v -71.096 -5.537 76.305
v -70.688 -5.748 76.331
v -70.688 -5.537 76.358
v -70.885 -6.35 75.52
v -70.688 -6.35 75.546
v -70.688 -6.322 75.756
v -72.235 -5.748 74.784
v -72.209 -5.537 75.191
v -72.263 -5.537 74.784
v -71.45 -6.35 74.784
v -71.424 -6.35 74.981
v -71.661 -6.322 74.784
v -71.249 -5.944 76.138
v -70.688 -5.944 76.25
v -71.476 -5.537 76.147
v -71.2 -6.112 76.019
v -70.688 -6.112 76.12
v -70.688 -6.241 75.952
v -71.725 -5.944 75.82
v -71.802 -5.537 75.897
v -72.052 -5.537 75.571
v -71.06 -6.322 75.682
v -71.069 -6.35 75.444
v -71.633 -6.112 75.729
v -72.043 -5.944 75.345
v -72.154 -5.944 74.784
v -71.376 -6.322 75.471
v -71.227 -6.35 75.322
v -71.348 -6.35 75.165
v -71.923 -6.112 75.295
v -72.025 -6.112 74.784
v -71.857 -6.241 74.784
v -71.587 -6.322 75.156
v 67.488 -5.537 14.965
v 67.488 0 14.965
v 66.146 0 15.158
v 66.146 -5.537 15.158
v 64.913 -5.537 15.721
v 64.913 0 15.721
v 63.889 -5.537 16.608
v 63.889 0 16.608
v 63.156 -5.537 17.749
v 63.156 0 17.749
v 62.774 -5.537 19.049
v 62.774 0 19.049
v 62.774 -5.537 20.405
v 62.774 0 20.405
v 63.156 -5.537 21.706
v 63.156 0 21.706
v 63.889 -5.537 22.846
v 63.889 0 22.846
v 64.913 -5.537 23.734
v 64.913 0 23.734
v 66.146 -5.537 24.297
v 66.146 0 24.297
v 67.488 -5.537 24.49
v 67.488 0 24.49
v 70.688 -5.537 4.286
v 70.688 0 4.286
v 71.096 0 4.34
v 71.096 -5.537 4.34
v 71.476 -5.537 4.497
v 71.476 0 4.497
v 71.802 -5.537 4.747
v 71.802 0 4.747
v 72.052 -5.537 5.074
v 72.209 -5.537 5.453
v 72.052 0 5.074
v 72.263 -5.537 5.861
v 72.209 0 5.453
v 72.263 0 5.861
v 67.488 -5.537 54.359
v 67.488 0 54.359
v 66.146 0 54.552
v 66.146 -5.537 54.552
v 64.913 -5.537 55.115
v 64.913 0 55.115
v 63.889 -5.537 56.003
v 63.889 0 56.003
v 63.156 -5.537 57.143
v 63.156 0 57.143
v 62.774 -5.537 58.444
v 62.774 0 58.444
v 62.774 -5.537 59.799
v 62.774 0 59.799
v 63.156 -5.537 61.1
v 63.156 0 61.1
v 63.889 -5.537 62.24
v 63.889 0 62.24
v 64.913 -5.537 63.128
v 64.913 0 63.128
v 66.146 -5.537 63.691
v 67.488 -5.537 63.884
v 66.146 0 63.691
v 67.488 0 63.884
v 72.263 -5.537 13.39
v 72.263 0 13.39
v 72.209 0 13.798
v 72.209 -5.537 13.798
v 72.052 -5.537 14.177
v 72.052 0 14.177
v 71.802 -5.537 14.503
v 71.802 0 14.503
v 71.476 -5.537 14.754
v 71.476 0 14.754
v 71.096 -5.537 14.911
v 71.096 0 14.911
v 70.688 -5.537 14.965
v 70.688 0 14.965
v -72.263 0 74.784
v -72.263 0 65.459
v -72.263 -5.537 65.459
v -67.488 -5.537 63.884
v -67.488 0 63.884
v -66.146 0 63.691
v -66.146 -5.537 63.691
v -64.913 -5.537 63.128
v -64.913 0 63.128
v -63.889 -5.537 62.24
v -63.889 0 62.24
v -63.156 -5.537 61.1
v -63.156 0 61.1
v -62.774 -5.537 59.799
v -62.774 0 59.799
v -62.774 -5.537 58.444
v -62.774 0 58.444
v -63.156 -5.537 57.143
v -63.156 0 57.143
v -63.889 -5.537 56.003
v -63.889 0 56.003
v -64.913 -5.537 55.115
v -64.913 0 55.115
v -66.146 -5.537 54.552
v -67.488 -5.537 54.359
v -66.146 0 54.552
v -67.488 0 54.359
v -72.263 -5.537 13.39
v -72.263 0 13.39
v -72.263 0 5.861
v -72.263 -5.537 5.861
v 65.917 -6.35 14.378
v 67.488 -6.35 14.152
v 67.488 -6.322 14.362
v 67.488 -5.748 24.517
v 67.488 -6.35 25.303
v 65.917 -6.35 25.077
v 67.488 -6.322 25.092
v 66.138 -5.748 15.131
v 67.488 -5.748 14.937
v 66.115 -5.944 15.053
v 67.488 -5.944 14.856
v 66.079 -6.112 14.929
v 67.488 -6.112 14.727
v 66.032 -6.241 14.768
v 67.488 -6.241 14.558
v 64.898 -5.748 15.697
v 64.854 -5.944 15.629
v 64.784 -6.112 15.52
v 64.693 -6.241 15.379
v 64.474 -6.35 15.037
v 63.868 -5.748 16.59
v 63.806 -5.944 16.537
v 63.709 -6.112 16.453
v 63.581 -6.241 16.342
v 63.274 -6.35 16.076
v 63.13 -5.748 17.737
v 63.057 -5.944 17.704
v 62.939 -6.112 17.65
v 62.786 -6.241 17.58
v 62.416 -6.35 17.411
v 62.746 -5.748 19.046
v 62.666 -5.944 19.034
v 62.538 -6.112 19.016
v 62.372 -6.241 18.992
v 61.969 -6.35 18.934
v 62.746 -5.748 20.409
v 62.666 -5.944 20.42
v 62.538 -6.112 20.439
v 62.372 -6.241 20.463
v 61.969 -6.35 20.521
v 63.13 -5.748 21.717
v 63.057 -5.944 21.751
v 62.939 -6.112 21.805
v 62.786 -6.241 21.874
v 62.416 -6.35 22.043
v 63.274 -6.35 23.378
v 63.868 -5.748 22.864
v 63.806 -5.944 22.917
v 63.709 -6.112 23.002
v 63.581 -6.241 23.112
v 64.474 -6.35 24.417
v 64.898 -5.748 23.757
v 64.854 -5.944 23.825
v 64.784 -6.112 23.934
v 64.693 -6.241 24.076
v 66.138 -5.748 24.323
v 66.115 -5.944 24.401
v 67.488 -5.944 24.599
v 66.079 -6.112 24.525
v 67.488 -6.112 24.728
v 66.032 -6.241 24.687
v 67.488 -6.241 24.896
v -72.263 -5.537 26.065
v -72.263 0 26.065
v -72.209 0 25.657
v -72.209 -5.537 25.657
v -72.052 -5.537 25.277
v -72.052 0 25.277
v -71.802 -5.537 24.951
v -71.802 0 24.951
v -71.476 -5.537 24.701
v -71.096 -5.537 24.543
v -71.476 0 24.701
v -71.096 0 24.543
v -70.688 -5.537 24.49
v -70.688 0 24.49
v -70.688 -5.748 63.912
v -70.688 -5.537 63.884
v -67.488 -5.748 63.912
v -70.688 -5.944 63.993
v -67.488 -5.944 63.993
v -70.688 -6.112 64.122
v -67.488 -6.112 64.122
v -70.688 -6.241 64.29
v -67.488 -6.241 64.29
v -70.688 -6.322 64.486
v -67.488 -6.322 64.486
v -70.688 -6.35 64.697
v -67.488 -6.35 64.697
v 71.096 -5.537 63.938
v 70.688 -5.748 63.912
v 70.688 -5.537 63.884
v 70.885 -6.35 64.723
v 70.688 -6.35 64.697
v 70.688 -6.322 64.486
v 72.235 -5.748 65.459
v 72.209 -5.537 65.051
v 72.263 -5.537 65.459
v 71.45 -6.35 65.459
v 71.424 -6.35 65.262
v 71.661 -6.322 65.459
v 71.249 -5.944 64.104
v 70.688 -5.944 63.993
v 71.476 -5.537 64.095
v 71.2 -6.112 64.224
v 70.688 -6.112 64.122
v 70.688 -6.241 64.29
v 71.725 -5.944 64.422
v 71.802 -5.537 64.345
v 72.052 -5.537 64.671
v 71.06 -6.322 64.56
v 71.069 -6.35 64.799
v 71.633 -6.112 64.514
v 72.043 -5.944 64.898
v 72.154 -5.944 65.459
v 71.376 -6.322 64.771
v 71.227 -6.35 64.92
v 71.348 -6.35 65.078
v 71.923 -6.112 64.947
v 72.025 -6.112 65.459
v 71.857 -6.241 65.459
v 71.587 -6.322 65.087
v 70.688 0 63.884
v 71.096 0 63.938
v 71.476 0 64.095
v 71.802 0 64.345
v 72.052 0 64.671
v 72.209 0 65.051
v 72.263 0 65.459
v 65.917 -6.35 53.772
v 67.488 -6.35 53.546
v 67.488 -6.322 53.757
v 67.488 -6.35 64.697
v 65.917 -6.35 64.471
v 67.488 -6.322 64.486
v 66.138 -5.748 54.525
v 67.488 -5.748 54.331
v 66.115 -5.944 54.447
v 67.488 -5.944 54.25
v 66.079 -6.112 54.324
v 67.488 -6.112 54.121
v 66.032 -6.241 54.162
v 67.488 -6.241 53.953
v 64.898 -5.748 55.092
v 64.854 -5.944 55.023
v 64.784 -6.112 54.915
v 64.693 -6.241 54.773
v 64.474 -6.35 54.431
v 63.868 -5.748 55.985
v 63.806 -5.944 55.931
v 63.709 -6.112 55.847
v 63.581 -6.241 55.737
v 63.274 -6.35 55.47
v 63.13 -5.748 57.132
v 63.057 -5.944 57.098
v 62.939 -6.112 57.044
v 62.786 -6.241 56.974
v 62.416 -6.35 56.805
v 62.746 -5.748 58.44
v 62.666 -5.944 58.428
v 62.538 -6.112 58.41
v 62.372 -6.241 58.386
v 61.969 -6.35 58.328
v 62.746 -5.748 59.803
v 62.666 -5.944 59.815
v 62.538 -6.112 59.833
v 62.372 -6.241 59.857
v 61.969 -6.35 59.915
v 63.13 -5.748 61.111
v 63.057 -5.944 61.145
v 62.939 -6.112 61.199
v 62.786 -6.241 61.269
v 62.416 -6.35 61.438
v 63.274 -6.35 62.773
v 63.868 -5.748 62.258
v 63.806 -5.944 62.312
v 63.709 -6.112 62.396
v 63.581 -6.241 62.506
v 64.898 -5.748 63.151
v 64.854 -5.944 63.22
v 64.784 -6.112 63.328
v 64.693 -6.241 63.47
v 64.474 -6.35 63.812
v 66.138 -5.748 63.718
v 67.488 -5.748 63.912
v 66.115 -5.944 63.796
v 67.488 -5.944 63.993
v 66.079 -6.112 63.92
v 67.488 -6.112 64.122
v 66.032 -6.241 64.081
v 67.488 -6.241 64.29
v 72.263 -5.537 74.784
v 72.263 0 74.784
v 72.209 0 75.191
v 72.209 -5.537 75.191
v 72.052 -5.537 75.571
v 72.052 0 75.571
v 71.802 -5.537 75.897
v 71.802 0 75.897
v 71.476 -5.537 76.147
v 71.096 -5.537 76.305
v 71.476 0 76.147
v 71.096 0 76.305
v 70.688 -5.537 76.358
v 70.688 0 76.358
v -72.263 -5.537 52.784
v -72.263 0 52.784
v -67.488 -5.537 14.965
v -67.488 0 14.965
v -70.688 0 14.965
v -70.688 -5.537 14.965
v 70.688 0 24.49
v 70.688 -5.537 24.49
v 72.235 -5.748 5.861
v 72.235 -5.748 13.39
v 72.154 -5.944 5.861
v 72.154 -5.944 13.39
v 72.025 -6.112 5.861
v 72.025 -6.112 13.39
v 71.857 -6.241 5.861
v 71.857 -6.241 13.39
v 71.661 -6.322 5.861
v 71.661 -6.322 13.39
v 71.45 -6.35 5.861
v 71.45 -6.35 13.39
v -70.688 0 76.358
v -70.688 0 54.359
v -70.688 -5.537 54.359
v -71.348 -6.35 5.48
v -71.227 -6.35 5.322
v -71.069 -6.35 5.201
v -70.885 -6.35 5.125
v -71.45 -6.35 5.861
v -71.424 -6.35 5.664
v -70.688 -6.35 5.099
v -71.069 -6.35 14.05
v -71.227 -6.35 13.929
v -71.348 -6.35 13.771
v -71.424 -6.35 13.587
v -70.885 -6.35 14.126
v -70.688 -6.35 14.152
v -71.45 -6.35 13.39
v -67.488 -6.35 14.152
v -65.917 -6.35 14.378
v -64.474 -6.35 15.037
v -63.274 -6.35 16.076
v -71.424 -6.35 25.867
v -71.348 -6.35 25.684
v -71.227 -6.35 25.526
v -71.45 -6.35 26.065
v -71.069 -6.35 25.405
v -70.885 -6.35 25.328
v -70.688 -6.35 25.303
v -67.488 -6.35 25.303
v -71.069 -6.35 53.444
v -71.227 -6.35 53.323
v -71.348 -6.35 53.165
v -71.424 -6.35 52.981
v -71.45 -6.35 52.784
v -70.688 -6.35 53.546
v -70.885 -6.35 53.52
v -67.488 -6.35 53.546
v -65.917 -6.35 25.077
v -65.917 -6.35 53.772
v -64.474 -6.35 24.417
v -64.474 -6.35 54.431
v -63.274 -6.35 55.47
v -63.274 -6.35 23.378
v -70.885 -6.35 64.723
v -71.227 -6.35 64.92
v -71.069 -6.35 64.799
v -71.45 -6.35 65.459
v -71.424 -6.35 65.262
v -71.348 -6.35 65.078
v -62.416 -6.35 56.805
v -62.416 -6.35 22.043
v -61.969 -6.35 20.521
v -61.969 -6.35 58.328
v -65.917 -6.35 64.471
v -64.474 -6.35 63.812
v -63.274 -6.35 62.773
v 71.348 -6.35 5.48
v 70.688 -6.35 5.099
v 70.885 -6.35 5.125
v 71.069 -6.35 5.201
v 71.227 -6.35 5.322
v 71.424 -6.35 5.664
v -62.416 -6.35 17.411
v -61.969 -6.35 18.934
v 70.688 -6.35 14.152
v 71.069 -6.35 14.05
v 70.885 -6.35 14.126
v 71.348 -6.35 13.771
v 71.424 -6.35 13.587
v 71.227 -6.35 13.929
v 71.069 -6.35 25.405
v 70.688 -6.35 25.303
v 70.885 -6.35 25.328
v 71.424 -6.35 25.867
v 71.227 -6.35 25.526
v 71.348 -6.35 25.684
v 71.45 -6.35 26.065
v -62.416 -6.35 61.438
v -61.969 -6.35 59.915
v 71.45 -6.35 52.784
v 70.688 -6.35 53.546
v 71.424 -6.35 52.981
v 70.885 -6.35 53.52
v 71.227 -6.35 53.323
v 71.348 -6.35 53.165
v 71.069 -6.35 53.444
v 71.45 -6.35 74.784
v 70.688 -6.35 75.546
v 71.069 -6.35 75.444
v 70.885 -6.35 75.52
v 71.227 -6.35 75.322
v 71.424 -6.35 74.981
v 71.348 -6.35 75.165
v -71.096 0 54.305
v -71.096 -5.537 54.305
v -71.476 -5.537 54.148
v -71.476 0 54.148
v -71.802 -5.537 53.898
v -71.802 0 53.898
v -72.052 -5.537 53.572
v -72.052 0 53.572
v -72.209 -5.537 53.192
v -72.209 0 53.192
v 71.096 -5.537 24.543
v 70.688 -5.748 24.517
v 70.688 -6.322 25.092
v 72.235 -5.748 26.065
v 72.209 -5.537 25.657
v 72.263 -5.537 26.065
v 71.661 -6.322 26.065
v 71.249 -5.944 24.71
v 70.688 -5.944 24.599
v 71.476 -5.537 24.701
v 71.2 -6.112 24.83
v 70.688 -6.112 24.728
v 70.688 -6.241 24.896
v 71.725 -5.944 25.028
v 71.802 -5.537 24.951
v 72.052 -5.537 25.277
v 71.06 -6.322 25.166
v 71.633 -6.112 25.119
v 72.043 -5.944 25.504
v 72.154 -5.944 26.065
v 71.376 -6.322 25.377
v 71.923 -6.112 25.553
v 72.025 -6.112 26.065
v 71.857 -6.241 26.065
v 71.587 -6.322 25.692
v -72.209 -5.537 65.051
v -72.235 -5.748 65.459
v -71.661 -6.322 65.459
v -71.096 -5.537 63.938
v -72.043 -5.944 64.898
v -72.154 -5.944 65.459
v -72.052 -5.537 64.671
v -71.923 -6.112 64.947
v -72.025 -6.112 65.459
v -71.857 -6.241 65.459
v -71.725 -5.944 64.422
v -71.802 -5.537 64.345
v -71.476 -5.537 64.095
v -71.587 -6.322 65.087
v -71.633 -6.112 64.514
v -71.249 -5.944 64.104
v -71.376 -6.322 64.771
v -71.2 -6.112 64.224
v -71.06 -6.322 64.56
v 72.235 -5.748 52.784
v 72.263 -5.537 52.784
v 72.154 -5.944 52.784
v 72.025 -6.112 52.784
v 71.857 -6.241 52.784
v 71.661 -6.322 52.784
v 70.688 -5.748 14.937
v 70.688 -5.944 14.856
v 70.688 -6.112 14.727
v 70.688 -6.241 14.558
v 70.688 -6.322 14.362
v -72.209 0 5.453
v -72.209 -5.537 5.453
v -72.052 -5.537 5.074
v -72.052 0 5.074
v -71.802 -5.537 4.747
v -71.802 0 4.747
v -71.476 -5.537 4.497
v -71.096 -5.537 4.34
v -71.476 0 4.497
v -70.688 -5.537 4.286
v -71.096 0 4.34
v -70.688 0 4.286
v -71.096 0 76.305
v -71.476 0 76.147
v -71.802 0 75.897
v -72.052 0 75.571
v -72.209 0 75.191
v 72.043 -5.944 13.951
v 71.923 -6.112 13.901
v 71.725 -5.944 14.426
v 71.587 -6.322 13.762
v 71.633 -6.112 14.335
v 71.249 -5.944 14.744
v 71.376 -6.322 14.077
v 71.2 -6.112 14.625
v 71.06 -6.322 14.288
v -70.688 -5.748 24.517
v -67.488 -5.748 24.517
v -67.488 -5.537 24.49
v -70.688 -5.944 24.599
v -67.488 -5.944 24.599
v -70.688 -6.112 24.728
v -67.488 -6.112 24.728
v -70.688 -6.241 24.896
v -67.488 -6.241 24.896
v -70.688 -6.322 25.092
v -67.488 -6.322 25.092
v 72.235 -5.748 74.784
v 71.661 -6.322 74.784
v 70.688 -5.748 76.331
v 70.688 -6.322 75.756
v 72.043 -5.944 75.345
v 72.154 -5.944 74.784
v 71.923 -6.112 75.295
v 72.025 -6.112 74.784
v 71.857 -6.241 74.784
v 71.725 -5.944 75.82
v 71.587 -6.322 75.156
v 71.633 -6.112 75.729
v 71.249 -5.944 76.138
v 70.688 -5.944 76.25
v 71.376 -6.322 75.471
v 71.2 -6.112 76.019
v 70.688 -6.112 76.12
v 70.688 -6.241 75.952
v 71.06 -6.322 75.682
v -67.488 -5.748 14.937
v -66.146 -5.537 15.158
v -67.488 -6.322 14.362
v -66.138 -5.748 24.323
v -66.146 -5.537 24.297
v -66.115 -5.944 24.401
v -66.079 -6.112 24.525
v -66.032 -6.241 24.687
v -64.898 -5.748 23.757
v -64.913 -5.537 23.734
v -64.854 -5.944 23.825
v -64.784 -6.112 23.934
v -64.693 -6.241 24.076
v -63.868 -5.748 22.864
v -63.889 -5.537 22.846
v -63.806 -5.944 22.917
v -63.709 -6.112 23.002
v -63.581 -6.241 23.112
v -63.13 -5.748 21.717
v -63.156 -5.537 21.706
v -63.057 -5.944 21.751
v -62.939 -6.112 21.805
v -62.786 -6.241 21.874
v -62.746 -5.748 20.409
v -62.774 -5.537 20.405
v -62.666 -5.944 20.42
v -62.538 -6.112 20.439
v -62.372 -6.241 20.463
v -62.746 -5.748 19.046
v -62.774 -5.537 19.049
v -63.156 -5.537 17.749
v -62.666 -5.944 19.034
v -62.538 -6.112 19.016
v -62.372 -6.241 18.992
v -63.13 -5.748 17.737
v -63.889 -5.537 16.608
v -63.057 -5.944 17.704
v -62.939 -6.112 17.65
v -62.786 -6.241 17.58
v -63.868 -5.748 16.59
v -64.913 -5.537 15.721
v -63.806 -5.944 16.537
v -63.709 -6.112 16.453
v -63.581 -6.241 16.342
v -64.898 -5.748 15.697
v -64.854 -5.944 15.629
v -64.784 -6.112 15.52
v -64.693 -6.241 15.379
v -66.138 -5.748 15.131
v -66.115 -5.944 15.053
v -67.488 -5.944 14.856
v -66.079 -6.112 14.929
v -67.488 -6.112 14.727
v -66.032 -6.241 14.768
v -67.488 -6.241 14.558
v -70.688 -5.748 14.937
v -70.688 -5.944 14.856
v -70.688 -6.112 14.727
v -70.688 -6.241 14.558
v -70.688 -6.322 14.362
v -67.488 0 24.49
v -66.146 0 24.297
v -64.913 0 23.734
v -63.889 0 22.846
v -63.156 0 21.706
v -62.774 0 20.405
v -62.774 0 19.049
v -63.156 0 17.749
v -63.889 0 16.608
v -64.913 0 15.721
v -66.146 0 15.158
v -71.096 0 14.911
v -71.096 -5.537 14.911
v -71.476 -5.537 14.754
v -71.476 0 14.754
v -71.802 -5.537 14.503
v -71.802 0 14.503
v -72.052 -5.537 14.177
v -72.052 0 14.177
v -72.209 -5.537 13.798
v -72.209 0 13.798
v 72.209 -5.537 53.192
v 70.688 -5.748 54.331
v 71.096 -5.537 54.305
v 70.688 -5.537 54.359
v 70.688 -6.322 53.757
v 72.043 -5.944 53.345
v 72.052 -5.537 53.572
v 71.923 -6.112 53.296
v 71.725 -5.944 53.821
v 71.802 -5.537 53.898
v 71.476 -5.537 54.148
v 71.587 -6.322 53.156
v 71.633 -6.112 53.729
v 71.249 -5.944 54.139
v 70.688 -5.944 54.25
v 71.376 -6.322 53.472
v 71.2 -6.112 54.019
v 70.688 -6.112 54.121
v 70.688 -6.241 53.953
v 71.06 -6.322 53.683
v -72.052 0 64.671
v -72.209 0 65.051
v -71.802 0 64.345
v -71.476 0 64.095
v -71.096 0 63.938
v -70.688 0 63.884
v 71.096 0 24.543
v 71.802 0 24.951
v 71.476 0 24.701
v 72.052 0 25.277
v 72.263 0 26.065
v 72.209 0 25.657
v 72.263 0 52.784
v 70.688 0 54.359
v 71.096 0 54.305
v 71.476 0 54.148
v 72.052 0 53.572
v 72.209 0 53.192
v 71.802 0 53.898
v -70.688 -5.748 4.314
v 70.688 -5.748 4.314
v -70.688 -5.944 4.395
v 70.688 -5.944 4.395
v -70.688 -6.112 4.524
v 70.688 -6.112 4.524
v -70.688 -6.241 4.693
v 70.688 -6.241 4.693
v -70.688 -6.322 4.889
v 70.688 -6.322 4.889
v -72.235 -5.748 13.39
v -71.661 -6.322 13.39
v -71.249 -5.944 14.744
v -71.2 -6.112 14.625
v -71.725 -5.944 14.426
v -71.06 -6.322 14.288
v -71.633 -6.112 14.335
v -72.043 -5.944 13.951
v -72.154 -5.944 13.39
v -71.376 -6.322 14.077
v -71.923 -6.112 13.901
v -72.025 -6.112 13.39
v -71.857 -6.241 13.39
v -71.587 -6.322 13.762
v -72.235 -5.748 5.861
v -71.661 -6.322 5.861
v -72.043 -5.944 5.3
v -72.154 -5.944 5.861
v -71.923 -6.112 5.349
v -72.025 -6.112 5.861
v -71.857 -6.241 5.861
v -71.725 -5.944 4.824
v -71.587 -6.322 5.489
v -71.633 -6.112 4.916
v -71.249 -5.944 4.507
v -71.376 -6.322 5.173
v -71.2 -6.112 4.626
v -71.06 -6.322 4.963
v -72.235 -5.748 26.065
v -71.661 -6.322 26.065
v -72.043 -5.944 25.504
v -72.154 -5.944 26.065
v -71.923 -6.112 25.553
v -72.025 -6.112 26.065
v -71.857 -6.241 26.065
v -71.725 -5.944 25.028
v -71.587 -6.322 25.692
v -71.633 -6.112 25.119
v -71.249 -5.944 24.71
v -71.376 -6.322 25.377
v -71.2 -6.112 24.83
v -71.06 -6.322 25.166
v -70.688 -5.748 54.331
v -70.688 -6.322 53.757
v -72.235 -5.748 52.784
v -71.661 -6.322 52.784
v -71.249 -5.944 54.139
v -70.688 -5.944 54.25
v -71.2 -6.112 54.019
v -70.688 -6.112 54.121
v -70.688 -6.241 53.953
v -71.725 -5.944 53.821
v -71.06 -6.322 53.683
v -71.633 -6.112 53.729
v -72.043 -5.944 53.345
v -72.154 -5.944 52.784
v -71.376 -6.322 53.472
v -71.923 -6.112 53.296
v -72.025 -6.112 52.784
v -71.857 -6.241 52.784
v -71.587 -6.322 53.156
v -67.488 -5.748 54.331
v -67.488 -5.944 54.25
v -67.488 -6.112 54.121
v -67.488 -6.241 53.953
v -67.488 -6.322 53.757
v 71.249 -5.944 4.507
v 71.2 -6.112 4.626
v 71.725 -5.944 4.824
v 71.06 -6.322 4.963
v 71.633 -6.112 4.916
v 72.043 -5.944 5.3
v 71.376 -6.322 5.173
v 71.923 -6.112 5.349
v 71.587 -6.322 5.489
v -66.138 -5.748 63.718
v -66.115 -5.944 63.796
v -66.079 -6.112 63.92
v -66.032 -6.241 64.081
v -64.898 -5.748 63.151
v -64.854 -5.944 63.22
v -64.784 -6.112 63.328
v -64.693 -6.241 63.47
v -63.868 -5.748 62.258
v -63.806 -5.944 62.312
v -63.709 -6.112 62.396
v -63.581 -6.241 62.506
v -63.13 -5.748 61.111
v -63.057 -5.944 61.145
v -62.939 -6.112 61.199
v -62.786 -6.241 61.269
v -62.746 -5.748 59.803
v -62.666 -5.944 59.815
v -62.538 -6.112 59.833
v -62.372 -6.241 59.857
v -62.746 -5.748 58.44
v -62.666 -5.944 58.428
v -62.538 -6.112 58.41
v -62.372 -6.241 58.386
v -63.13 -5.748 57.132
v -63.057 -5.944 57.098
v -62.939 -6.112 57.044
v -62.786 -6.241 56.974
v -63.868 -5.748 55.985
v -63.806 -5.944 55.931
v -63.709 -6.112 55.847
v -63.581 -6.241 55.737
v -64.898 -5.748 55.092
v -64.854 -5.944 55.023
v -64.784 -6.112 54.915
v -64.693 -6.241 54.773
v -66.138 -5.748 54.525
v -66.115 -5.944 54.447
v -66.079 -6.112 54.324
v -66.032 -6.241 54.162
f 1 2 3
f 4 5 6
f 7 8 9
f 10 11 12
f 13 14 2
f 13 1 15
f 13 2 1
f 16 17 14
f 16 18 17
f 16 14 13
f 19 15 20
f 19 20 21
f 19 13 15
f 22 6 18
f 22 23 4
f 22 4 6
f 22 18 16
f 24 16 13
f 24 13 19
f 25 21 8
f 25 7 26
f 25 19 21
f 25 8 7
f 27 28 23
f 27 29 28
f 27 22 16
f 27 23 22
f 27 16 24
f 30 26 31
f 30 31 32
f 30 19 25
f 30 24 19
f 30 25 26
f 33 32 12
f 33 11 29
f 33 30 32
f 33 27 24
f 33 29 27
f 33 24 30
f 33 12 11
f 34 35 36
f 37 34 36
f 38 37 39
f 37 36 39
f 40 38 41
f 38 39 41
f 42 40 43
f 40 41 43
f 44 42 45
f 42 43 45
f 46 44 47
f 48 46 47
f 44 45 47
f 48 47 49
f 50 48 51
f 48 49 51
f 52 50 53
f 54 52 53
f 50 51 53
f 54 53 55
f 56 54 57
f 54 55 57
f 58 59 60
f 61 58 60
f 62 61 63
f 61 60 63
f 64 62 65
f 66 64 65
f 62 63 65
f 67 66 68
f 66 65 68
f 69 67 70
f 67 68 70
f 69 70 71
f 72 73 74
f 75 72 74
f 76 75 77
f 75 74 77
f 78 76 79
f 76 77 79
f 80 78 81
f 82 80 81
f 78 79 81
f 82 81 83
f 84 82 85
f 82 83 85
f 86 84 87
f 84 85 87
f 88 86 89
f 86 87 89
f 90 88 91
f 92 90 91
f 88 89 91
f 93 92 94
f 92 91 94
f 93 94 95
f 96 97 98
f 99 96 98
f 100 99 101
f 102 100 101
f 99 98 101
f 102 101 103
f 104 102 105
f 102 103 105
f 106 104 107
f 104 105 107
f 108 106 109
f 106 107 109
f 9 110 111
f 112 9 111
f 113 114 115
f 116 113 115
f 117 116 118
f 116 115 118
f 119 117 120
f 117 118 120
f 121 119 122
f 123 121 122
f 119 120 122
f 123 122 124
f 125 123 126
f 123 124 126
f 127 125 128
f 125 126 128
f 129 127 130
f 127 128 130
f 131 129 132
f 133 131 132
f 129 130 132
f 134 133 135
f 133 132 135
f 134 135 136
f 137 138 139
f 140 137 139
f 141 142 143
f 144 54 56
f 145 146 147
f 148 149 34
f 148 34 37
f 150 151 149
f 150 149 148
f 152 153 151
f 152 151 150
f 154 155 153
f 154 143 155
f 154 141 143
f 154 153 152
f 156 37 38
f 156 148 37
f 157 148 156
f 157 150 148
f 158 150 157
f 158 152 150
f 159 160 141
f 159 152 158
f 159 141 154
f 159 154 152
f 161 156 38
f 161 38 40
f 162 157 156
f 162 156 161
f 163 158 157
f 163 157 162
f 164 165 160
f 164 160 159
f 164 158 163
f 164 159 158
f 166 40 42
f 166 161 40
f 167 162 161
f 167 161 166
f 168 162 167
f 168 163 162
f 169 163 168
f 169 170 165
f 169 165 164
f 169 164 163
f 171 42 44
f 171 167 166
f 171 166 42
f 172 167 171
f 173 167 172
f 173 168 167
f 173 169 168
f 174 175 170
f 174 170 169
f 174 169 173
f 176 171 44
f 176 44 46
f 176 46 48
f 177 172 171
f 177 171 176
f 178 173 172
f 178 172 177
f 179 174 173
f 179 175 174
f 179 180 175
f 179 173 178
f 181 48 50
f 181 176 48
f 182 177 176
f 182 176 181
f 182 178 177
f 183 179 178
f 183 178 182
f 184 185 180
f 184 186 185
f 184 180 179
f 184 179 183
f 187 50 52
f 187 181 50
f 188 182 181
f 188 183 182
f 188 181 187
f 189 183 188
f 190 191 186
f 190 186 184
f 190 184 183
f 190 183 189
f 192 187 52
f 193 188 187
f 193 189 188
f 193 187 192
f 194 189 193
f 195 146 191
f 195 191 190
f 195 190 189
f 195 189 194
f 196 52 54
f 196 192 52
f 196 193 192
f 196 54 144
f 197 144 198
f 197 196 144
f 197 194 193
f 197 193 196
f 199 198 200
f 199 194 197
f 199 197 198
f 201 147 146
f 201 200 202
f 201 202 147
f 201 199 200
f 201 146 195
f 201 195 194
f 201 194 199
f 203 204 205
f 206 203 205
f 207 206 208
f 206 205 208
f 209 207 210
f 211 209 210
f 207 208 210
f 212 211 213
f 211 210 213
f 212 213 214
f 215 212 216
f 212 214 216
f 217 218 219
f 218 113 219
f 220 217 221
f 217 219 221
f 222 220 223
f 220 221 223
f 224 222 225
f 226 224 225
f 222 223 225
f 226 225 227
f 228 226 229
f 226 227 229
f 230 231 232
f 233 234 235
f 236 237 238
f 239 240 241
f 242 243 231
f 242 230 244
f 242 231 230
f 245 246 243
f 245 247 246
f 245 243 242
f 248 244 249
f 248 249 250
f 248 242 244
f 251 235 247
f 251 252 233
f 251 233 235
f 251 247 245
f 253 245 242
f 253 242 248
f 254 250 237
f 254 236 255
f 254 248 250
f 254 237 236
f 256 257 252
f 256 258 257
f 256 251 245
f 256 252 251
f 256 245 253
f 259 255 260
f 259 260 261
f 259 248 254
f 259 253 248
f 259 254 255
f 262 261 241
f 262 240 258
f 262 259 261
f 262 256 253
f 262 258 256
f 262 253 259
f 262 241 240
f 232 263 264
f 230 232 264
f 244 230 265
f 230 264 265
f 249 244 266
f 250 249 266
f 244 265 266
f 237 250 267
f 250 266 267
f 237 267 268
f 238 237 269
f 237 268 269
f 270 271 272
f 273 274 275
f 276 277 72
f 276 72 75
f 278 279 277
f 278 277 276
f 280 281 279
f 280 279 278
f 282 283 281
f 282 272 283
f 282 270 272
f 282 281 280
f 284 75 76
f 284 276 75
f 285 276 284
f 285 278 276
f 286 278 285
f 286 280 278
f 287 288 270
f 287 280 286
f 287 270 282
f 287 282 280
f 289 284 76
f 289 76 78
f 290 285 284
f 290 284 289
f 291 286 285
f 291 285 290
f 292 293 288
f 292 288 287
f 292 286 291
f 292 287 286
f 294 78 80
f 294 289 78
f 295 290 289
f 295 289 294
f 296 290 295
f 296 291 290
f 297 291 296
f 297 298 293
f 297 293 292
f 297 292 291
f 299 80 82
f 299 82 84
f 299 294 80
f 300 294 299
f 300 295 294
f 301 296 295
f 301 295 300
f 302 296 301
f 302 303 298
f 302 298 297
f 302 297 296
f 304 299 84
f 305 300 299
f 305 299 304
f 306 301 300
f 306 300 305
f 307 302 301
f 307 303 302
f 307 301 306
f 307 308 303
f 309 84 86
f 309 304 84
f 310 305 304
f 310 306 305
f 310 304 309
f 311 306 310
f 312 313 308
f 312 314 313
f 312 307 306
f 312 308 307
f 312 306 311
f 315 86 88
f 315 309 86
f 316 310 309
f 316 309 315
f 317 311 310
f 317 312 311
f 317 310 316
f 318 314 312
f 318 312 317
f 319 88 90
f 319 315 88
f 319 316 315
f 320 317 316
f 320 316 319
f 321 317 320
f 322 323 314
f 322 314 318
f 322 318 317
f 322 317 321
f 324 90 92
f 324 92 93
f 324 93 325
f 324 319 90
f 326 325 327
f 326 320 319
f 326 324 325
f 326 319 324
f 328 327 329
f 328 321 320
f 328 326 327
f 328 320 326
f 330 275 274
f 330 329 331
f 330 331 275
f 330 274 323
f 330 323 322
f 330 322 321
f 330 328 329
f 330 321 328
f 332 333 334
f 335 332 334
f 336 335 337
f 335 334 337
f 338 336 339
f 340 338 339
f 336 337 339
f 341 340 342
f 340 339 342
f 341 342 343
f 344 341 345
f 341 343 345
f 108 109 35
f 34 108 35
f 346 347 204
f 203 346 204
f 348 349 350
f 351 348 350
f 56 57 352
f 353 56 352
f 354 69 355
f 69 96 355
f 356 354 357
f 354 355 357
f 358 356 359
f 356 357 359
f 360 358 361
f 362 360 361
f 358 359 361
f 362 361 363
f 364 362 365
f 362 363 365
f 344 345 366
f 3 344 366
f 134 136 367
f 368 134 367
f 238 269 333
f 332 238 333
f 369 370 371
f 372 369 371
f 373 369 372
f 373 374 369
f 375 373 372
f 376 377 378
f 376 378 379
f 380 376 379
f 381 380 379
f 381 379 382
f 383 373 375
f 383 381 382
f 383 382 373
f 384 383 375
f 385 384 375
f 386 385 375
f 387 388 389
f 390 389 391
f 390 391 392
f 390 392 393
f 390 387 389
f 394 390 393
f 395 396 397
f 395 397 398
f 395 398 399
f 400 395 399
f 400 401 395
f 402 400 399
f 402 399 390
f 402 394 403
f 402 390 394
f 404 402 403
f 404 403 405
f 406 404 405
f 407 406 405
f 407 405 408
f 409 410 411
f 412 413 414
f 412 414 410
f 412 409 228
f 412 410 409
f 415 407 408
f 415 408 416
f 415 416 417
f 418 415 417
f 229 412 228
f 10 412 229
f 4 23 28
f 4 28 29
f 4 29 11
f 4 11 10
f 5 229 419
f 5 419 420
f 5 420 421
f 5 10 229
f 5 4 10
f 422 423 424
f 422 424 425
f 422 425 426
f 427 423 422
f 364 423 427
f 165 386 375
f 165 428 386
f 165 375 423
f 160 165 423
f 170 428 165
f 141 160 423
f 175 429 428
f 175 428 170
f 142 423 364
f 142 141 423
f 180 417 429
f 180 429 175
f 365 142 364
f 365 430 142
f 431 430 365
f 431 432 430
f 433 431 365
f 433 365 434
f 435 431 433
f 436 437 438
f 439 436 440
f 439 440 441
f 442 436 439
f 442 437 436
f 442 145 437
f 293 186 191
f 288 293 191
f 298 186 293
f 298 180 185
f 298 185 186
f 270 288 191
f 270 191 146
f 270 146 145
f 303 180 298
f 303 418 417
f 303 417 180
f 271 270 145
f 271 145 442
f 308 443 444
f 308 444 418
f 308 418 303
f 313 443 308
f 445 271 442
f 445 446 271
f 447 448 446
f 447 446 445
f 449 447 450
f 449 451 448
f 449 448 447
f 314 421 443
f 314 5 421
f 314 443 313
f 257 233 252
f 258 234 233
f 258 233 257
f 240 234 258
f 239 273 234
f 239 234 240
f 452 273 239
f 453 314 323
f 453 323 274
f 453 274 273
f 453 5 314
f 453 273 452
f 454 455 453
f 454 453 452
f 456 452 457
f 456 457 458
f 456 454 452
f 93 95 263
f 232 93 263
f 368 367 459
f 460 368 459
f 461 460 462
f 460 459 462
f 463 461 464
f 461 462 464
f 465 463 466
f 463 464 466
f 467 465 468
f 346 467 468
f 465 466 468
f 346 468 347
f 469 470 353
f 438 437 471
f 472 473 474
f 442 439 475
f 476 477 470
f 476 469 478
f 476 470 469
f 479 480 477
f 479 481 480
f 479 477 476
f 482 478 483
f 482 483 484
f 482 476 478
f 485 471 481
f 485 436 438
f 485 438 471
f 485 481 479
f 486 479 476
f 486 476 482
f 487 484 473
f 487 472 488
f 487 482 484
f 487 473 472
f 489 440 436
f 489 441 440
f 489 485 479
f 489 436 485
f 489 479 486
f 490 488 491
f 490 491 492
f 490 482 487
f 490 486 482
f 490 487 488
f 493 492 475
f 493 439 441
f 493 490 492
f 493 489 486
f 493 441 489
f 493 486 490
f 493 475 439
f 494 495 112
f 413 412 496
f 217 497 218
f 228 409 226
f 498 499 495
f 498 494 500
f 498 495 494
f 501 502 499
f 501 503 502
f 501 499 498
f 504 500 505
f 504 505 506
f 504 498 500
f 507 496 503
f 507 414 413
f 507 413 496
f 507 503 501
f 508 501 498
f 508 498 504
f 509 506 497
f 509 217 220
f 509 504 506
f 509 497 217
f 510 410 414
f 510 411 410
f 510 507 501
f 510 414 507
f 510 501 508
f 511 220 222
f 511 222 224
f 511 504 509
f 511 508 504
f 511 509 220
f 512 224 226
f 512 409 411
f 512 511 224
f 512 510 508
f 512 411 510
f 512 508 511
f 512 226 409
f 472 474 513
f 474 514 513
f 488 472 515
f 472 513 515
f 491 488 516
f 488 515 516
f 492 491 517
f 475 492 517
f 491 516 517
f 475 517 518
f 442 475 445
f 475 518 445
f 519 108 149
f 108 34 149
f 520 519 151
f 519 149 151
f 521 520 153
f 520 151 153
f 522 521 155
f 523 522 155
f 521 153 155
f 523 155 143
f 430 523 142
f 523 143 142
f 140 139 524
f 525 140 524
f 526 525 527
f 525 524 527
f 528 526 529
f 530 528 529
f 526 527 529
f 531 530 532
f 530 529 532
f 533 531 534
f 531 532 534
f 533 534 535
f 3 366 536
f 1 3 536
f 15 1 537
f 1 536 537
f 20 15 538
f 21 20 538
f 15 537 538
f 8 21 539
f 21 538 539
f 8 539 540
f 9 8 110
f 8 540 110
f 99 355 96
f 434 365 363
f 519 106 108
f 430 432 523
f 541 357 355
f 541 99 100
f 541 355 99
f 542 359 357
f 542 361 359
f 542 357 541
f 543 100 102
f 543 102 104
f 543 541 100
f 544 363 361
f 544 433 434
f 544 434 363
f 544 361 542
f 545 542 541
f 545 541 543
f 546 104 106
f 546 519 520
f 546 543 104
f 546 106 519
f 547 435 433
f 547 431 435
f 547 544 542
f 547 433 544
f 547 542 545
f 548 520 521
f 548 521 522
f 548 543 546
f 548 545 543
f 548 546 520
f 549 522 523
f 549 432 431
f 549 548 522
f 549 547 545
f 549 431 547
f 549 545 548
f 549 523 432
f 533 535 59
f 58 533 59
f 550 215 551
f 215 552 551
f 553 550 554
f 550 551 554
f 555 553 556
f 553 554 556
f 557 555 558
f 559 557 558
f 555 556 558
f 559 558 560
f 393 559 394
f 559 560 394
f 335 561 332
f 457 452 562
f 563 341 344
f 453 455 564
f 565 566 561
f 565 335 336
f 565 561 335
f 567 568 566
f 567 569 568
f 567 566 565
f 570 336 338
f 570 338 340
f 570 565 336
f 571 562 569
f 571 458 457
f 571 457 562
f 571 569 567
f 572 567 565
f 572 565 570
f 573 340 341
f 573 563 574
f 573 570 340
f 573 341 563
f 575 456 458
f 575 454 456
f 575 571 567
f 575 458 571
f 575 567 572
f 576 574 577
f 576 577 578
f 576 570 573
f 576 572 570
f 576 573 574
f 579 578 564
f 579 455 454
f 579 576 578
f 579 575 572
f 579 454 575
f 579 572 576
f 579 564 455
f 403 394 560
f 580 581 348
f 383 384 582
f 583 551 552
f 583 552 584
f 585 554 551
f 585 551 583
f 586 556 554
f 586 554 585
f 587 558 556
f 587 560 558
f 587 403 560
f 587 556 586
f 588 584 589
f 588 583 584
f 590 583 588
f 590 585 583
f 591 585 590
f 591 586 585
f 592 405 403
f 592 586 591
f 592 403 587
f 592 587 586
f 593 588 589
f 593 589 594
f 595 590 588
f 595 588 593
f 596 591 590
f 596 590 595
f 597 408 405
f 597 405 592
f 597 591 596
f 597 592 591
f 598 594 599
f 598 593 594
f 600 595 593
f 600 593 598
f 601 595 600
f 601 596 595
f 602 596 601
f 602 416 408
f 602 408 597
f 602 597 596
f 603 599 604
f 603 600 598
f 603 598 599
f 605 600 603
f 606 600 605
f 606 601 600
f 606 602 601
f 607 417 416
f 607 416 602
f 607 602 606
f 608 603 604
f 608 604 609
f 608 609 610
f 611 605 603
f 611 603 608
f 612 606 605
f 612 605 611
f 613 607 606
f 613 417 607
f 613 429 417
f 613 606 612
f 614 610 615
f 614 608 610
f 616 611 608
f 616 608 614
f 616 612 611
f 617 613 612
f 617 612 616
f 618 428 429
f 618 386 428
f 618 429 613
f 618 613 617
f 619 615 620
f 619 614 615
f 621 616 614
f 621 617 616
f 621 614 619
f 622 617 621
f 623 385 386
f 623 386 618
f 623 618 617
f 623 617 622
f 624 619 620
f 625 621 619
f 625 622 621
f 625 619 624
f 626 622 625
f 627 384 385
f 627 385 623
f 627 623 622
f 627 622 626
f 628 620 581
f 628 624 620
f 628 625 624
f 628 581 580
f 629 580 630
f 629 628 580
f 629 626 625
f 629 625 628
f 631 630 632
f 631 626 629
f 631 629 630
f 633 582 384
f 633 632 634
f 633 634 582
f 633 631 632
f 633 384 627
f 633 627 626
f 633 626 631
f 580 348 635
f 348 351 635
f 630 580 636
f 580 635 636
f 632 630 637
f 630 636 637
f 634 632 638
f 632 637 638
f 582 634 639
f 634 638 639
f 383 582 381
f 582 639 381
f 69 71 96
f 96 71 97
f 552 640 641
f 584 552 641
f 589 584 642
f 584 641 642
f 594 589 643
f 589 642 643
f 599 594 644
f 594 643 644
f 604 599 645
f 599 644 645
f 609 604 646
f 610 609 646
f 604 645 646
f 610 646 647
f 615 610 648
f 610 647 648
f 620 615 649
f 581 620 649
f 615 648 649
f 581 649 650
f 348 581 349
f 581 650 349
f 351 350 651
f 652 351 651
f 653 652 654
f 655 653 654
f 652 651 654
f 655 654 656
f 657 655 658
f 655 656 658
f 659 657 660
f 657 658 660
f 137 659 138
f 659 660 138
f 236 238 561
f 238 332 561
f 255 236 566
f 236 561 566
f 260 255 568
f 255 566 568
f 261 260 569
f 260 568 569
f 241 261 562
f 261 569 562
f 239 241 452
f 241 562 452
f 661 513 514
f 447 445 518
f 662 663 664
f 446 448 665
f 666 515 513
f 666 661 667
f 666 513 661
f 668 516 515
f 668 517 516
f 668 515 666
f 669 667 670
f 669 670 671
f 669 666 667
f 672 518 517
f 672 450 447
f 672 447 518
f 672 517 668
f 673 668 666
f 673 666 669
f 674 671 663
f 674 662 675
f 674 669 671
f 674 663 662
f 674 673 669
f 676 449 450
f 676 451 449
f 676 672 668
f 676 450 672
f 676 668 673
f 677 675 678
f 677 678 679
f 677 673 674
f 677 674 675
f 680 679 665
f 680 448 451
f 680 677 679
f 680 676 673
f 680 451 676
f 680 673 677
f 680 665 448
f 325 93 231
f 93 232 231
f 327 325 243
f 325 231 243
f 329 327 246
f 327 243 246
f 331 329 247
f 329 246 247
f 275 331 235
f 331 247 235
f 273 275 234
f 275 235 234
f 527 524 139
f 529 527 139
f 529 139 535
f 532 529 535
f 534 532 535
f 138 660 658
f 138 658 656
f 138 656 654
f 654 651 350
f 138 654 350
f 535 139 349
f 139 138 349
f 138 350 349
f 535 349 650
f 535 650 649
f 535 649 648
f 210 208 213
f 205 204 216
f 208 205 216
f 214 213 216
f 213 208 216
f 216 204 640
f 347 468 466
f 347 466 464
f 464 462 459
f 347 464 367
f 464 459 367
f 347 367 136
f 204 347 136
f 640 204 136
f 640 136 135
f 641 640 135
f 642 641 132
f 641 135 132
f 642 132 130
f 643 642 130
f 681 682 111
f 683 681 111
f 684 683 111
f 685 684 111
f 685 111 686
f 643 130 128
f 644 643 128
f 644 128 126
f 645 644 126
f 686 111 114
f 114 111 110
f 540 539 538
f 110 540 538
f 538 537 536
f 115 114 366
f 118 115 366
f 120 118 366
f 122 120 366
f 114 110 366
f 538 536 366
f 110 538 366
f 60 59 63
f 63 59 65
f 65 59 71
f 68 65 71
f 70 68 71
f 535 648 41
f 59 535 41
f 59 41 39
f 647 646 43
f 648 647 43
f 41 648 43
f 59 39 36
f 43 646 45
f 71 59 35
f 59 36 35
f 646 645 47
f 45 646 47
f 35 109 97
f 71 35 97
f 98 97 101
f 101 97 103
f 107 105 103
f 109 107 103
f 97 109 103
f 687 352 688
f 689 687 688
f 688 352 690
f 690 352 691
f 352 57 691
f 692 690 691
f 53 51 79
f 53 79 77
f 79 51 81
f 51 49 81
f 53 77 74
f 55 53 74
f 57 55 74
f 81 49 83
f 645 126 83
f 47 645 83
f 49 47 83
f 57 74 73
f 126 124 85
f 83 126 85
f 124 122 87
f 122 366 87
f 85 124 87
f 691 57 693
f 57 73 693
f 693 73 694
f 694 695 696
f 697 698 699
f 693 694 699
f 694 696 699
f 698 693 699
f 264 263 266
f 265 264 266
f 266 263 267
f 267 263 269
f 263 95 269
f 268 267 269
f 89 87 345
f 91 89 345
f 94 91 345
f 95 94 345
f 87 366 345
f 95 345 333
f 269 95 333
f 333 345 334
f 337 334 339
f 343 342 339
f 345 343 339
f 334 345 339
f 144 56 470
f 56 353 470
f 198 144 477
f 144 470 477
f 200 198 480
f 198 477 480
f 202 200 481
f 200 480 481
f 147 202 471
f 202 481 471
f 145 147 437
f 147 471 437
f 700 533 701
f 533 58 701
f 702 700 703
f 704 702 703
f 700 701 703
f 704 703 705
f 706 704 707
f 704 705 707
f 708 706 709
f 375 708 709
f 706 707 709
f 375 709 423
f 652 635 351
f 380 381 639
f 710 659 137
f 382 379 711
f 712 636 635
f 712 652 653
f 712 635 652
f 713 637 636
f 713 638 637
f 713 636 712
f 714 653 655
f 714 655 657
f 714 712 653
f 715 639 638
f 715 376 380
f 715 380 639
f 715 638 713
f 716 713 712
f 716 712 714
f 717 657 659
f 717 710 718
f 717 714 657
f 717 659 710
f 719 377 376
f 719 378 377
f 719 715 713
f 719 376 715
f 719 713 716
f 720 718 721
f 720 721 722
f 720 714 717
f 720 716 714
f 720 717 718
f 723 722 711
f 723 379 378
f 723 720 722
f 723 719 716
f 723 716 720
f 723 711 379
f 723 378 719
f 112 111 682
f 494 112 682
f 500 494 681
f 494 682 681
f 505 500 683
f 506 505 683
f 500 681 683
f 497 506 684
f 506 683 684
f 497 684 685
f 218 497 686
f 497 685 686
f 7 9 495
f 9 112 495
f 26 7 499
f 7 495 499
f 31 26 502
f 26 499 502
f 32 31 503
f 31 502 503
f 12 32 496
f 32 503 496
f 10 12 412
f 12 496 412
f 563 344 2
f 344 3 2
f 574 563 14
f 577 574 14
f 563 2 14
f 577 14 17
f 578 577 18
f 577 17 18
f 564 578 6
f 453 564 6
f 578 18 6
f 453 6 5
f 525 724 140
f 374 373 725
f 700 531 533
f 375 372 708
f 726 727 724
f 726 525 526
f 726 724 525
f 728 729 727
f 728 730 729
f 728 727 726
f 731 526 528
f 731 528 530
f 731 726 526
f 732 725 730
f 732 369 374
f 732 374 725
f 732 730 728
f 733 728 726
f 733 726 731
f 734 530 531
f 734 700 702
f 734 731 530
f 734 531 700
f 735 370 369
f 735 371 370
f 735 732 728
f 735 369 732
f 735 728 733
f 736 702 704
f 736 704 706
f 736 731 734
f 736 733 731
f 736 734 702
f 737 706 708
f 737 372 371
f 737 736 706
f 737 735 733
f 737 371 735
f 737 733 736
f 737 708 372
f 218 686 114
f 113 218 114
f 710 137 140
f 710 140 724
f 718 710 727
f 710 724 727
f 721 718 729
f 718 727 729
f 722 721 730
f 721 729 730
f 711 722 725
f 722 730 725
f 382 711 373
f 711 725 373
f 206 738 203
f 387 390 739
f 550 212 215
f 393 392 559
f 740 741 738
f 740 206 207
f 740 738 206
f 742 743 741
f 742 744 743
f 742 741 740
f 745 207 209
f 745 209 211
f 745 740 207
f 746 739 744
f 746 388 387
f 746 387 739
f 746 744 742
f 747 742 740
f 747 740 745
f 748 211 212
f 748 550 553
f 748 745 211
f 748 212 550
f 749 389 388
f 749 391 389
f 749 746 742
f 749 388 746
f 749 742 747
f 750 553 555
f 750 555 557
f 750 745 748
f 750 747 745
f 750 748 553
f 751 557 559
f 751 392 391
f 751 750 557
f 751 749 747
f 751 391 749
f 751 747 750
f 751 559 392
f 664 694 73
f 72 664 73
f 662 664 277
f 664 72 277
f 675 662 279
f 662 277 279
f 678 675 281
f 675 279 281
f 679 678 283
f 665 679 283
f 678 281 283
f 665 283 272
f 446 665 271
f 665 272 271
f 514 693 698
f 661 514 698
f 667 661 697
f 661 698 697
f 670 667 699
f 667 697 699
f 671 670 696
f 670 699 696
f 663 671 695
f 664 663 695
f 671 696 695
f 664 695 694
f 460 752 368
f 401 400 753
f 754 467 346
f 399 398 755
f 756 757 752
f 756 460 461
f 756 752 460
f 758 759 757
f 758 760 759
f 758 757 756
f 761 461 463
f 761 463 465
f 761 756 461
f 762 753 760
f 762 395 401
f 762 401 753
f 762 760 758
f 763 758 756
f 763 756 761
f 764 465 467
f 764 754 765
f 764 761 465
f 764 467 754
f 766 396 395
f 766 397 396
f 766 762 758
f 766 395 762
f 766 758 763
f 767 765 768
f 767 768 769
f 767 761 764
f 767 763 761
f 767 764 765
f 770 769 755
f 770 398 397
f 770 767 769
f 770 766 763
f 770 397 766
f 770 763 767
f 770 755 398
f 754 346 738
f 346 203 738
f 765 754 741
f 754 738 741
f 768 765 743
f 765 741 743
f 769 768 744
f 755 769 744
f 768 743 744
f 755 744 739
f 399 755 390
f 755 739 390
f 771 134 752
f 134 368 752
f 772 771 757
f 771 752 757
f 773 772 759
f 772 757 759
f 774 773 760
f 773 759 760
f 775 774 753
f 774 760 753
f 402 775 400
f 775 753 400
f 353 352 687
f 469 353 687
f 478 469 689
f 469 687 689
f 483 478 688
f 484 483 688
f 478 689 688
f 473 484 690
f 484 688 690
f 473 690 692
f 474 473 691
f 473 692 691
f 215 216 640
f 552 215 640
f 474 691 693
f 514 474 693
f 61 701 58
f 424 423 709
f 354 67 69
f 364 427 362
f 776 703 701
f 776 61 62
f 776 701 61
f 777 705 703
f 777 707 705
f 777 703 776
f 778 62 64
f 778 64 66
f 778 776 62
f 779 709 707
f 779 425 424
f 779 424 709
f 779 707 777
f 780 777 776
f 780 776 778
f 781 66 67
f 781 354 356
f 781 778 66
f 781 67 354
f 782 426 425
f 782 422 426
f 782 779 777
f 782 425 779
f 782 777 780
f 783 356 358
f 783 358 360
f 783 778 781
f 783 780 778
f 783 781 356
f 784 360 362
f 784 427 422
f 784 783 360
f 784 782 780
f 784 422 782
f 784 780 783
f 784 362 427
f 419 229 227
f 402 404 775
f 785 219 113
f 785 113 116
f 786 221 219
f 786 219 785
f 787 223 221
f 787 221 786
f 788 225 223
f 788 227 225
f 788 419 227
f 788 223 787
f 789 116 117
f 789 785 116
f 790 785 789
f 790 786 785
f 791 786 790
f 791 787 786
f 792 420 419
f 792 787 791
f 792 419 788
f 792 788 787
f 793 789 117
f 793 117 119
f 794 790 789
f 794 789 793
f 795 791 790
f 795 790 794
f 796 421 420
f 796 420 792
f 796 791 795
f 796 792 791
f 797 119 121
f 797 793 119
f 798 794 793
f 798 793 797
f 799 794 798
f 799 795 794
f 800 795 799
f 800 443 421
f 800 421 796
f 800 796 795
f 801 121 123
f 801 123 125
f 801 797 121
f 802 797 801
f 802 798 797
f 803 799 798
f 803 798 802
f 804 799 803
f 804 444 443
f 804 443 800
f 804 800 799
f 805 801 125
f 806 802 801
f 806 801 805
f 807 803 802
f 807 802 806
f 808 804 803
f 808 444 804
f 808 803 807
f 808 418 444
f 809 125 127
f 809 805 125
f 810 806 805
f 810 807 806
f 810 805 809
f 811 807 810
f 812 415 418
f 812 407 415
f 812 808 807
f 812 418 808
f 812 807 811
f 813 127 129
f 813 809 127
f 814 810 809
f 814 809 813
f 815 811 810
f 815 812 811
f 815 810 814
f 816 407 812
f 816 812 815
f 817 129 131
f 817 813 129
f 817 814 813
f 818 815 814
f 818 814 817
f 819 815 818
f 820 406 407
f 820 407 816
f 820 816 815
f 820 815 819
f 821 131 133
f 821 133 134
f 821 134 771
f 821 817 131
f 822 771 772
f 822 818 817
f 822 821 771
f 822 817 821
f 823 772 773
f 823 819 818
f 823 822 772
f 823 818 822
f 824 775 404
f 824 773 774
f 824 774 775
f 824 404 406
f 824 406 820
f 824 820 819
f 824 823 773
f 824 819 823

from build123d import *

# Parameters (mm, degrees)
F1_DEPTH = 6.35
F2_R     = 0.8128


with BuildPart() as f1:
    # F0 (on Front) → F1 (new body)
    with BuildSketch(Plane.XZ):
        with BuildLine():
            ThreePointArc((-70.6882, 76.358423), (-71.801752, 75.897174), (-72.263, 74.783623))
            Line((-72.263, 74.783623), (-72.263, 65.458811))
            ThreePointArc((-72.263, 65.458811), (-71.801752, 64.34526), (-70.6882, 63.884011))
            Line((-70.6882, 63.884011), (-67.4878, 63.884011))
            ThreePointArc((-67.4878, 63.884011), (-62.7253, 59.121511), (-67.4878, 54.359011))
            Line((-67.4878, 54.359011), (-70.6882, 54.359011))
            ThreePointArc((-70.6882, 54.359011), (-71.801752, 53.897763), (-72.263, 52.784211))
            Line((-72.263, 52.784211), (-72.263, 26.064518))
            ThreePointArc((-72.263, 26.064518), (-71.801752, 24.950967), (-70.6882, 24.489718))
            Line((-70.6882, 24.489718), (-67.4878, 24.489718))
            ThreePointArc((-67.4878, 24.489718), (-62.7253, 19.727218), (-67.4878, 14.964718))
            Line((-67.4878, 14.964718), (-70.6882, 14.964718))
            ThreePointArc((-70.6882, 14.964718), (-71.801752, 14.50347), (-72.263, 13.389918))
            Line((-72.263, 13.389918), (-72.263, 5.860977))
            ThreePointArc((-72.263, 5.860977), (-71.801752, 4.747425), (-70.6882, 4.286177))
            Line((-70.6882, 4.286177), (0, 4.286177))
            Line((0, 4.286177), (70.6882, 4.286177))
            ThreePointArc((70.6882, 4.286177), (71.801752, 4.747425), (72.263, 5.860977))
            Line((72.263, 5.860977), (72.263, 13.389918))
            ThreePointArc((72.263, 13.389918), (71.801752, 14.50347), (70.6882, 14.964718))
            Line((70.6882, 14.964718), (67.4878, 14.964718))
            ThreePointArc((67.4878, 14.964718), (62.7253, 19.727218), (67.4878, 24.489718))
            Line((67.4878, 24.489718), (70.6882, 24.489718))
            ThreePointArc((70.6882, 24.489718), (71.801752, 24.950967), (72.263, 26.064518))
            Line((72.263, 26.064518), (72.263, 52.784211))
            ThreePointArc((72.263, 52.784211), (71.801752, 53.897763), (70.6882, 54.359011))
            Line((70.6882, 54.359011), (67.4878, 54.359011))
            ThreePointArc((67.4878, 54.359011), (62.7253, 59.121511), (67.4878, 63.884011))
            Line((67.4878, 63.884011), (70.6882, 63.884011))
            ThreePointArc((70.6882, 63.884011), (71.801752, 64.34526), (72.263, 65.458811))
            Line((72.263, 65.458811), (72.263, 74.783623))
            ThreePointArc((72.263, 74.783623), (71.801752, 75.897174), (70.6882, 76.358423))
            Line((70.6882, 76.358423), (3.71171, 76.358423))
            Line((3.71171, 76.358423), (-3.71171, 76.358423))
            Line((-3.71171, 76.358423), (-70.6882, 76.358423))
        make_face()
    extrude(amount=F1_DEPTH)

    # F2
    f2_edges = [f1.edges().sort_by_distance(p)[0] for p in [
        (-72.263, -6.35, 70.121217),
        (-71.801752, -6.35, 75.897174),
        (0, -6.35, 76.358423),
        (71.801752, -6.35, 75.897174),
        (72.263, -6.35, 70.121217),
        (71.801752, -6.35, 64.34526),
        (62.7253, -6.35, 59.121511),
        (69.088, -6.35, 63.884011),
        (69.088, -6.35, 54.359011),
        (71.801752, -6.35, 53.897763),
        (72.263, -6.35, 39.424365),
        (71.801752, -6.35, 24.950967),
        (69.088, -6.35, 24.489718),
        (62.7253, -6.35, 19.727218),
        (69.088, -6.35, 14.964718),
        (71.801752, -6.35, 14.50347),
        (72.263, -6.35, 9.625448),
        (71.801752, -6.35, 4.747425),
        (0, -6.35, 4.286177),
        (-71.801752, -6.35, 4.747425),
        (-72.263, -6.35, 9.625448),
        (-71.801752, -6.35, 14.50347),
        (-62.7253, -6.35, 19.727218),
        (-69.088, -6.35, 14.964718),
        (-69.088, -6.35, 24.489718),
        (-71.801752, -6.35, 24.950967),
        (-72.263, -6.35, 39.424365),
        (-71.801752, -6.35, 53.897763),
        (-62.7253, -6.35, 59.121511),
        (-69.088, -6.35, 54.359011),
        (-69.088, -6.35, 63.884011),
        (-71.801752, -6.35, 64.34526),
    ]]
    fillet(f2_edges, radius=F2_R)


solid = f1.part
